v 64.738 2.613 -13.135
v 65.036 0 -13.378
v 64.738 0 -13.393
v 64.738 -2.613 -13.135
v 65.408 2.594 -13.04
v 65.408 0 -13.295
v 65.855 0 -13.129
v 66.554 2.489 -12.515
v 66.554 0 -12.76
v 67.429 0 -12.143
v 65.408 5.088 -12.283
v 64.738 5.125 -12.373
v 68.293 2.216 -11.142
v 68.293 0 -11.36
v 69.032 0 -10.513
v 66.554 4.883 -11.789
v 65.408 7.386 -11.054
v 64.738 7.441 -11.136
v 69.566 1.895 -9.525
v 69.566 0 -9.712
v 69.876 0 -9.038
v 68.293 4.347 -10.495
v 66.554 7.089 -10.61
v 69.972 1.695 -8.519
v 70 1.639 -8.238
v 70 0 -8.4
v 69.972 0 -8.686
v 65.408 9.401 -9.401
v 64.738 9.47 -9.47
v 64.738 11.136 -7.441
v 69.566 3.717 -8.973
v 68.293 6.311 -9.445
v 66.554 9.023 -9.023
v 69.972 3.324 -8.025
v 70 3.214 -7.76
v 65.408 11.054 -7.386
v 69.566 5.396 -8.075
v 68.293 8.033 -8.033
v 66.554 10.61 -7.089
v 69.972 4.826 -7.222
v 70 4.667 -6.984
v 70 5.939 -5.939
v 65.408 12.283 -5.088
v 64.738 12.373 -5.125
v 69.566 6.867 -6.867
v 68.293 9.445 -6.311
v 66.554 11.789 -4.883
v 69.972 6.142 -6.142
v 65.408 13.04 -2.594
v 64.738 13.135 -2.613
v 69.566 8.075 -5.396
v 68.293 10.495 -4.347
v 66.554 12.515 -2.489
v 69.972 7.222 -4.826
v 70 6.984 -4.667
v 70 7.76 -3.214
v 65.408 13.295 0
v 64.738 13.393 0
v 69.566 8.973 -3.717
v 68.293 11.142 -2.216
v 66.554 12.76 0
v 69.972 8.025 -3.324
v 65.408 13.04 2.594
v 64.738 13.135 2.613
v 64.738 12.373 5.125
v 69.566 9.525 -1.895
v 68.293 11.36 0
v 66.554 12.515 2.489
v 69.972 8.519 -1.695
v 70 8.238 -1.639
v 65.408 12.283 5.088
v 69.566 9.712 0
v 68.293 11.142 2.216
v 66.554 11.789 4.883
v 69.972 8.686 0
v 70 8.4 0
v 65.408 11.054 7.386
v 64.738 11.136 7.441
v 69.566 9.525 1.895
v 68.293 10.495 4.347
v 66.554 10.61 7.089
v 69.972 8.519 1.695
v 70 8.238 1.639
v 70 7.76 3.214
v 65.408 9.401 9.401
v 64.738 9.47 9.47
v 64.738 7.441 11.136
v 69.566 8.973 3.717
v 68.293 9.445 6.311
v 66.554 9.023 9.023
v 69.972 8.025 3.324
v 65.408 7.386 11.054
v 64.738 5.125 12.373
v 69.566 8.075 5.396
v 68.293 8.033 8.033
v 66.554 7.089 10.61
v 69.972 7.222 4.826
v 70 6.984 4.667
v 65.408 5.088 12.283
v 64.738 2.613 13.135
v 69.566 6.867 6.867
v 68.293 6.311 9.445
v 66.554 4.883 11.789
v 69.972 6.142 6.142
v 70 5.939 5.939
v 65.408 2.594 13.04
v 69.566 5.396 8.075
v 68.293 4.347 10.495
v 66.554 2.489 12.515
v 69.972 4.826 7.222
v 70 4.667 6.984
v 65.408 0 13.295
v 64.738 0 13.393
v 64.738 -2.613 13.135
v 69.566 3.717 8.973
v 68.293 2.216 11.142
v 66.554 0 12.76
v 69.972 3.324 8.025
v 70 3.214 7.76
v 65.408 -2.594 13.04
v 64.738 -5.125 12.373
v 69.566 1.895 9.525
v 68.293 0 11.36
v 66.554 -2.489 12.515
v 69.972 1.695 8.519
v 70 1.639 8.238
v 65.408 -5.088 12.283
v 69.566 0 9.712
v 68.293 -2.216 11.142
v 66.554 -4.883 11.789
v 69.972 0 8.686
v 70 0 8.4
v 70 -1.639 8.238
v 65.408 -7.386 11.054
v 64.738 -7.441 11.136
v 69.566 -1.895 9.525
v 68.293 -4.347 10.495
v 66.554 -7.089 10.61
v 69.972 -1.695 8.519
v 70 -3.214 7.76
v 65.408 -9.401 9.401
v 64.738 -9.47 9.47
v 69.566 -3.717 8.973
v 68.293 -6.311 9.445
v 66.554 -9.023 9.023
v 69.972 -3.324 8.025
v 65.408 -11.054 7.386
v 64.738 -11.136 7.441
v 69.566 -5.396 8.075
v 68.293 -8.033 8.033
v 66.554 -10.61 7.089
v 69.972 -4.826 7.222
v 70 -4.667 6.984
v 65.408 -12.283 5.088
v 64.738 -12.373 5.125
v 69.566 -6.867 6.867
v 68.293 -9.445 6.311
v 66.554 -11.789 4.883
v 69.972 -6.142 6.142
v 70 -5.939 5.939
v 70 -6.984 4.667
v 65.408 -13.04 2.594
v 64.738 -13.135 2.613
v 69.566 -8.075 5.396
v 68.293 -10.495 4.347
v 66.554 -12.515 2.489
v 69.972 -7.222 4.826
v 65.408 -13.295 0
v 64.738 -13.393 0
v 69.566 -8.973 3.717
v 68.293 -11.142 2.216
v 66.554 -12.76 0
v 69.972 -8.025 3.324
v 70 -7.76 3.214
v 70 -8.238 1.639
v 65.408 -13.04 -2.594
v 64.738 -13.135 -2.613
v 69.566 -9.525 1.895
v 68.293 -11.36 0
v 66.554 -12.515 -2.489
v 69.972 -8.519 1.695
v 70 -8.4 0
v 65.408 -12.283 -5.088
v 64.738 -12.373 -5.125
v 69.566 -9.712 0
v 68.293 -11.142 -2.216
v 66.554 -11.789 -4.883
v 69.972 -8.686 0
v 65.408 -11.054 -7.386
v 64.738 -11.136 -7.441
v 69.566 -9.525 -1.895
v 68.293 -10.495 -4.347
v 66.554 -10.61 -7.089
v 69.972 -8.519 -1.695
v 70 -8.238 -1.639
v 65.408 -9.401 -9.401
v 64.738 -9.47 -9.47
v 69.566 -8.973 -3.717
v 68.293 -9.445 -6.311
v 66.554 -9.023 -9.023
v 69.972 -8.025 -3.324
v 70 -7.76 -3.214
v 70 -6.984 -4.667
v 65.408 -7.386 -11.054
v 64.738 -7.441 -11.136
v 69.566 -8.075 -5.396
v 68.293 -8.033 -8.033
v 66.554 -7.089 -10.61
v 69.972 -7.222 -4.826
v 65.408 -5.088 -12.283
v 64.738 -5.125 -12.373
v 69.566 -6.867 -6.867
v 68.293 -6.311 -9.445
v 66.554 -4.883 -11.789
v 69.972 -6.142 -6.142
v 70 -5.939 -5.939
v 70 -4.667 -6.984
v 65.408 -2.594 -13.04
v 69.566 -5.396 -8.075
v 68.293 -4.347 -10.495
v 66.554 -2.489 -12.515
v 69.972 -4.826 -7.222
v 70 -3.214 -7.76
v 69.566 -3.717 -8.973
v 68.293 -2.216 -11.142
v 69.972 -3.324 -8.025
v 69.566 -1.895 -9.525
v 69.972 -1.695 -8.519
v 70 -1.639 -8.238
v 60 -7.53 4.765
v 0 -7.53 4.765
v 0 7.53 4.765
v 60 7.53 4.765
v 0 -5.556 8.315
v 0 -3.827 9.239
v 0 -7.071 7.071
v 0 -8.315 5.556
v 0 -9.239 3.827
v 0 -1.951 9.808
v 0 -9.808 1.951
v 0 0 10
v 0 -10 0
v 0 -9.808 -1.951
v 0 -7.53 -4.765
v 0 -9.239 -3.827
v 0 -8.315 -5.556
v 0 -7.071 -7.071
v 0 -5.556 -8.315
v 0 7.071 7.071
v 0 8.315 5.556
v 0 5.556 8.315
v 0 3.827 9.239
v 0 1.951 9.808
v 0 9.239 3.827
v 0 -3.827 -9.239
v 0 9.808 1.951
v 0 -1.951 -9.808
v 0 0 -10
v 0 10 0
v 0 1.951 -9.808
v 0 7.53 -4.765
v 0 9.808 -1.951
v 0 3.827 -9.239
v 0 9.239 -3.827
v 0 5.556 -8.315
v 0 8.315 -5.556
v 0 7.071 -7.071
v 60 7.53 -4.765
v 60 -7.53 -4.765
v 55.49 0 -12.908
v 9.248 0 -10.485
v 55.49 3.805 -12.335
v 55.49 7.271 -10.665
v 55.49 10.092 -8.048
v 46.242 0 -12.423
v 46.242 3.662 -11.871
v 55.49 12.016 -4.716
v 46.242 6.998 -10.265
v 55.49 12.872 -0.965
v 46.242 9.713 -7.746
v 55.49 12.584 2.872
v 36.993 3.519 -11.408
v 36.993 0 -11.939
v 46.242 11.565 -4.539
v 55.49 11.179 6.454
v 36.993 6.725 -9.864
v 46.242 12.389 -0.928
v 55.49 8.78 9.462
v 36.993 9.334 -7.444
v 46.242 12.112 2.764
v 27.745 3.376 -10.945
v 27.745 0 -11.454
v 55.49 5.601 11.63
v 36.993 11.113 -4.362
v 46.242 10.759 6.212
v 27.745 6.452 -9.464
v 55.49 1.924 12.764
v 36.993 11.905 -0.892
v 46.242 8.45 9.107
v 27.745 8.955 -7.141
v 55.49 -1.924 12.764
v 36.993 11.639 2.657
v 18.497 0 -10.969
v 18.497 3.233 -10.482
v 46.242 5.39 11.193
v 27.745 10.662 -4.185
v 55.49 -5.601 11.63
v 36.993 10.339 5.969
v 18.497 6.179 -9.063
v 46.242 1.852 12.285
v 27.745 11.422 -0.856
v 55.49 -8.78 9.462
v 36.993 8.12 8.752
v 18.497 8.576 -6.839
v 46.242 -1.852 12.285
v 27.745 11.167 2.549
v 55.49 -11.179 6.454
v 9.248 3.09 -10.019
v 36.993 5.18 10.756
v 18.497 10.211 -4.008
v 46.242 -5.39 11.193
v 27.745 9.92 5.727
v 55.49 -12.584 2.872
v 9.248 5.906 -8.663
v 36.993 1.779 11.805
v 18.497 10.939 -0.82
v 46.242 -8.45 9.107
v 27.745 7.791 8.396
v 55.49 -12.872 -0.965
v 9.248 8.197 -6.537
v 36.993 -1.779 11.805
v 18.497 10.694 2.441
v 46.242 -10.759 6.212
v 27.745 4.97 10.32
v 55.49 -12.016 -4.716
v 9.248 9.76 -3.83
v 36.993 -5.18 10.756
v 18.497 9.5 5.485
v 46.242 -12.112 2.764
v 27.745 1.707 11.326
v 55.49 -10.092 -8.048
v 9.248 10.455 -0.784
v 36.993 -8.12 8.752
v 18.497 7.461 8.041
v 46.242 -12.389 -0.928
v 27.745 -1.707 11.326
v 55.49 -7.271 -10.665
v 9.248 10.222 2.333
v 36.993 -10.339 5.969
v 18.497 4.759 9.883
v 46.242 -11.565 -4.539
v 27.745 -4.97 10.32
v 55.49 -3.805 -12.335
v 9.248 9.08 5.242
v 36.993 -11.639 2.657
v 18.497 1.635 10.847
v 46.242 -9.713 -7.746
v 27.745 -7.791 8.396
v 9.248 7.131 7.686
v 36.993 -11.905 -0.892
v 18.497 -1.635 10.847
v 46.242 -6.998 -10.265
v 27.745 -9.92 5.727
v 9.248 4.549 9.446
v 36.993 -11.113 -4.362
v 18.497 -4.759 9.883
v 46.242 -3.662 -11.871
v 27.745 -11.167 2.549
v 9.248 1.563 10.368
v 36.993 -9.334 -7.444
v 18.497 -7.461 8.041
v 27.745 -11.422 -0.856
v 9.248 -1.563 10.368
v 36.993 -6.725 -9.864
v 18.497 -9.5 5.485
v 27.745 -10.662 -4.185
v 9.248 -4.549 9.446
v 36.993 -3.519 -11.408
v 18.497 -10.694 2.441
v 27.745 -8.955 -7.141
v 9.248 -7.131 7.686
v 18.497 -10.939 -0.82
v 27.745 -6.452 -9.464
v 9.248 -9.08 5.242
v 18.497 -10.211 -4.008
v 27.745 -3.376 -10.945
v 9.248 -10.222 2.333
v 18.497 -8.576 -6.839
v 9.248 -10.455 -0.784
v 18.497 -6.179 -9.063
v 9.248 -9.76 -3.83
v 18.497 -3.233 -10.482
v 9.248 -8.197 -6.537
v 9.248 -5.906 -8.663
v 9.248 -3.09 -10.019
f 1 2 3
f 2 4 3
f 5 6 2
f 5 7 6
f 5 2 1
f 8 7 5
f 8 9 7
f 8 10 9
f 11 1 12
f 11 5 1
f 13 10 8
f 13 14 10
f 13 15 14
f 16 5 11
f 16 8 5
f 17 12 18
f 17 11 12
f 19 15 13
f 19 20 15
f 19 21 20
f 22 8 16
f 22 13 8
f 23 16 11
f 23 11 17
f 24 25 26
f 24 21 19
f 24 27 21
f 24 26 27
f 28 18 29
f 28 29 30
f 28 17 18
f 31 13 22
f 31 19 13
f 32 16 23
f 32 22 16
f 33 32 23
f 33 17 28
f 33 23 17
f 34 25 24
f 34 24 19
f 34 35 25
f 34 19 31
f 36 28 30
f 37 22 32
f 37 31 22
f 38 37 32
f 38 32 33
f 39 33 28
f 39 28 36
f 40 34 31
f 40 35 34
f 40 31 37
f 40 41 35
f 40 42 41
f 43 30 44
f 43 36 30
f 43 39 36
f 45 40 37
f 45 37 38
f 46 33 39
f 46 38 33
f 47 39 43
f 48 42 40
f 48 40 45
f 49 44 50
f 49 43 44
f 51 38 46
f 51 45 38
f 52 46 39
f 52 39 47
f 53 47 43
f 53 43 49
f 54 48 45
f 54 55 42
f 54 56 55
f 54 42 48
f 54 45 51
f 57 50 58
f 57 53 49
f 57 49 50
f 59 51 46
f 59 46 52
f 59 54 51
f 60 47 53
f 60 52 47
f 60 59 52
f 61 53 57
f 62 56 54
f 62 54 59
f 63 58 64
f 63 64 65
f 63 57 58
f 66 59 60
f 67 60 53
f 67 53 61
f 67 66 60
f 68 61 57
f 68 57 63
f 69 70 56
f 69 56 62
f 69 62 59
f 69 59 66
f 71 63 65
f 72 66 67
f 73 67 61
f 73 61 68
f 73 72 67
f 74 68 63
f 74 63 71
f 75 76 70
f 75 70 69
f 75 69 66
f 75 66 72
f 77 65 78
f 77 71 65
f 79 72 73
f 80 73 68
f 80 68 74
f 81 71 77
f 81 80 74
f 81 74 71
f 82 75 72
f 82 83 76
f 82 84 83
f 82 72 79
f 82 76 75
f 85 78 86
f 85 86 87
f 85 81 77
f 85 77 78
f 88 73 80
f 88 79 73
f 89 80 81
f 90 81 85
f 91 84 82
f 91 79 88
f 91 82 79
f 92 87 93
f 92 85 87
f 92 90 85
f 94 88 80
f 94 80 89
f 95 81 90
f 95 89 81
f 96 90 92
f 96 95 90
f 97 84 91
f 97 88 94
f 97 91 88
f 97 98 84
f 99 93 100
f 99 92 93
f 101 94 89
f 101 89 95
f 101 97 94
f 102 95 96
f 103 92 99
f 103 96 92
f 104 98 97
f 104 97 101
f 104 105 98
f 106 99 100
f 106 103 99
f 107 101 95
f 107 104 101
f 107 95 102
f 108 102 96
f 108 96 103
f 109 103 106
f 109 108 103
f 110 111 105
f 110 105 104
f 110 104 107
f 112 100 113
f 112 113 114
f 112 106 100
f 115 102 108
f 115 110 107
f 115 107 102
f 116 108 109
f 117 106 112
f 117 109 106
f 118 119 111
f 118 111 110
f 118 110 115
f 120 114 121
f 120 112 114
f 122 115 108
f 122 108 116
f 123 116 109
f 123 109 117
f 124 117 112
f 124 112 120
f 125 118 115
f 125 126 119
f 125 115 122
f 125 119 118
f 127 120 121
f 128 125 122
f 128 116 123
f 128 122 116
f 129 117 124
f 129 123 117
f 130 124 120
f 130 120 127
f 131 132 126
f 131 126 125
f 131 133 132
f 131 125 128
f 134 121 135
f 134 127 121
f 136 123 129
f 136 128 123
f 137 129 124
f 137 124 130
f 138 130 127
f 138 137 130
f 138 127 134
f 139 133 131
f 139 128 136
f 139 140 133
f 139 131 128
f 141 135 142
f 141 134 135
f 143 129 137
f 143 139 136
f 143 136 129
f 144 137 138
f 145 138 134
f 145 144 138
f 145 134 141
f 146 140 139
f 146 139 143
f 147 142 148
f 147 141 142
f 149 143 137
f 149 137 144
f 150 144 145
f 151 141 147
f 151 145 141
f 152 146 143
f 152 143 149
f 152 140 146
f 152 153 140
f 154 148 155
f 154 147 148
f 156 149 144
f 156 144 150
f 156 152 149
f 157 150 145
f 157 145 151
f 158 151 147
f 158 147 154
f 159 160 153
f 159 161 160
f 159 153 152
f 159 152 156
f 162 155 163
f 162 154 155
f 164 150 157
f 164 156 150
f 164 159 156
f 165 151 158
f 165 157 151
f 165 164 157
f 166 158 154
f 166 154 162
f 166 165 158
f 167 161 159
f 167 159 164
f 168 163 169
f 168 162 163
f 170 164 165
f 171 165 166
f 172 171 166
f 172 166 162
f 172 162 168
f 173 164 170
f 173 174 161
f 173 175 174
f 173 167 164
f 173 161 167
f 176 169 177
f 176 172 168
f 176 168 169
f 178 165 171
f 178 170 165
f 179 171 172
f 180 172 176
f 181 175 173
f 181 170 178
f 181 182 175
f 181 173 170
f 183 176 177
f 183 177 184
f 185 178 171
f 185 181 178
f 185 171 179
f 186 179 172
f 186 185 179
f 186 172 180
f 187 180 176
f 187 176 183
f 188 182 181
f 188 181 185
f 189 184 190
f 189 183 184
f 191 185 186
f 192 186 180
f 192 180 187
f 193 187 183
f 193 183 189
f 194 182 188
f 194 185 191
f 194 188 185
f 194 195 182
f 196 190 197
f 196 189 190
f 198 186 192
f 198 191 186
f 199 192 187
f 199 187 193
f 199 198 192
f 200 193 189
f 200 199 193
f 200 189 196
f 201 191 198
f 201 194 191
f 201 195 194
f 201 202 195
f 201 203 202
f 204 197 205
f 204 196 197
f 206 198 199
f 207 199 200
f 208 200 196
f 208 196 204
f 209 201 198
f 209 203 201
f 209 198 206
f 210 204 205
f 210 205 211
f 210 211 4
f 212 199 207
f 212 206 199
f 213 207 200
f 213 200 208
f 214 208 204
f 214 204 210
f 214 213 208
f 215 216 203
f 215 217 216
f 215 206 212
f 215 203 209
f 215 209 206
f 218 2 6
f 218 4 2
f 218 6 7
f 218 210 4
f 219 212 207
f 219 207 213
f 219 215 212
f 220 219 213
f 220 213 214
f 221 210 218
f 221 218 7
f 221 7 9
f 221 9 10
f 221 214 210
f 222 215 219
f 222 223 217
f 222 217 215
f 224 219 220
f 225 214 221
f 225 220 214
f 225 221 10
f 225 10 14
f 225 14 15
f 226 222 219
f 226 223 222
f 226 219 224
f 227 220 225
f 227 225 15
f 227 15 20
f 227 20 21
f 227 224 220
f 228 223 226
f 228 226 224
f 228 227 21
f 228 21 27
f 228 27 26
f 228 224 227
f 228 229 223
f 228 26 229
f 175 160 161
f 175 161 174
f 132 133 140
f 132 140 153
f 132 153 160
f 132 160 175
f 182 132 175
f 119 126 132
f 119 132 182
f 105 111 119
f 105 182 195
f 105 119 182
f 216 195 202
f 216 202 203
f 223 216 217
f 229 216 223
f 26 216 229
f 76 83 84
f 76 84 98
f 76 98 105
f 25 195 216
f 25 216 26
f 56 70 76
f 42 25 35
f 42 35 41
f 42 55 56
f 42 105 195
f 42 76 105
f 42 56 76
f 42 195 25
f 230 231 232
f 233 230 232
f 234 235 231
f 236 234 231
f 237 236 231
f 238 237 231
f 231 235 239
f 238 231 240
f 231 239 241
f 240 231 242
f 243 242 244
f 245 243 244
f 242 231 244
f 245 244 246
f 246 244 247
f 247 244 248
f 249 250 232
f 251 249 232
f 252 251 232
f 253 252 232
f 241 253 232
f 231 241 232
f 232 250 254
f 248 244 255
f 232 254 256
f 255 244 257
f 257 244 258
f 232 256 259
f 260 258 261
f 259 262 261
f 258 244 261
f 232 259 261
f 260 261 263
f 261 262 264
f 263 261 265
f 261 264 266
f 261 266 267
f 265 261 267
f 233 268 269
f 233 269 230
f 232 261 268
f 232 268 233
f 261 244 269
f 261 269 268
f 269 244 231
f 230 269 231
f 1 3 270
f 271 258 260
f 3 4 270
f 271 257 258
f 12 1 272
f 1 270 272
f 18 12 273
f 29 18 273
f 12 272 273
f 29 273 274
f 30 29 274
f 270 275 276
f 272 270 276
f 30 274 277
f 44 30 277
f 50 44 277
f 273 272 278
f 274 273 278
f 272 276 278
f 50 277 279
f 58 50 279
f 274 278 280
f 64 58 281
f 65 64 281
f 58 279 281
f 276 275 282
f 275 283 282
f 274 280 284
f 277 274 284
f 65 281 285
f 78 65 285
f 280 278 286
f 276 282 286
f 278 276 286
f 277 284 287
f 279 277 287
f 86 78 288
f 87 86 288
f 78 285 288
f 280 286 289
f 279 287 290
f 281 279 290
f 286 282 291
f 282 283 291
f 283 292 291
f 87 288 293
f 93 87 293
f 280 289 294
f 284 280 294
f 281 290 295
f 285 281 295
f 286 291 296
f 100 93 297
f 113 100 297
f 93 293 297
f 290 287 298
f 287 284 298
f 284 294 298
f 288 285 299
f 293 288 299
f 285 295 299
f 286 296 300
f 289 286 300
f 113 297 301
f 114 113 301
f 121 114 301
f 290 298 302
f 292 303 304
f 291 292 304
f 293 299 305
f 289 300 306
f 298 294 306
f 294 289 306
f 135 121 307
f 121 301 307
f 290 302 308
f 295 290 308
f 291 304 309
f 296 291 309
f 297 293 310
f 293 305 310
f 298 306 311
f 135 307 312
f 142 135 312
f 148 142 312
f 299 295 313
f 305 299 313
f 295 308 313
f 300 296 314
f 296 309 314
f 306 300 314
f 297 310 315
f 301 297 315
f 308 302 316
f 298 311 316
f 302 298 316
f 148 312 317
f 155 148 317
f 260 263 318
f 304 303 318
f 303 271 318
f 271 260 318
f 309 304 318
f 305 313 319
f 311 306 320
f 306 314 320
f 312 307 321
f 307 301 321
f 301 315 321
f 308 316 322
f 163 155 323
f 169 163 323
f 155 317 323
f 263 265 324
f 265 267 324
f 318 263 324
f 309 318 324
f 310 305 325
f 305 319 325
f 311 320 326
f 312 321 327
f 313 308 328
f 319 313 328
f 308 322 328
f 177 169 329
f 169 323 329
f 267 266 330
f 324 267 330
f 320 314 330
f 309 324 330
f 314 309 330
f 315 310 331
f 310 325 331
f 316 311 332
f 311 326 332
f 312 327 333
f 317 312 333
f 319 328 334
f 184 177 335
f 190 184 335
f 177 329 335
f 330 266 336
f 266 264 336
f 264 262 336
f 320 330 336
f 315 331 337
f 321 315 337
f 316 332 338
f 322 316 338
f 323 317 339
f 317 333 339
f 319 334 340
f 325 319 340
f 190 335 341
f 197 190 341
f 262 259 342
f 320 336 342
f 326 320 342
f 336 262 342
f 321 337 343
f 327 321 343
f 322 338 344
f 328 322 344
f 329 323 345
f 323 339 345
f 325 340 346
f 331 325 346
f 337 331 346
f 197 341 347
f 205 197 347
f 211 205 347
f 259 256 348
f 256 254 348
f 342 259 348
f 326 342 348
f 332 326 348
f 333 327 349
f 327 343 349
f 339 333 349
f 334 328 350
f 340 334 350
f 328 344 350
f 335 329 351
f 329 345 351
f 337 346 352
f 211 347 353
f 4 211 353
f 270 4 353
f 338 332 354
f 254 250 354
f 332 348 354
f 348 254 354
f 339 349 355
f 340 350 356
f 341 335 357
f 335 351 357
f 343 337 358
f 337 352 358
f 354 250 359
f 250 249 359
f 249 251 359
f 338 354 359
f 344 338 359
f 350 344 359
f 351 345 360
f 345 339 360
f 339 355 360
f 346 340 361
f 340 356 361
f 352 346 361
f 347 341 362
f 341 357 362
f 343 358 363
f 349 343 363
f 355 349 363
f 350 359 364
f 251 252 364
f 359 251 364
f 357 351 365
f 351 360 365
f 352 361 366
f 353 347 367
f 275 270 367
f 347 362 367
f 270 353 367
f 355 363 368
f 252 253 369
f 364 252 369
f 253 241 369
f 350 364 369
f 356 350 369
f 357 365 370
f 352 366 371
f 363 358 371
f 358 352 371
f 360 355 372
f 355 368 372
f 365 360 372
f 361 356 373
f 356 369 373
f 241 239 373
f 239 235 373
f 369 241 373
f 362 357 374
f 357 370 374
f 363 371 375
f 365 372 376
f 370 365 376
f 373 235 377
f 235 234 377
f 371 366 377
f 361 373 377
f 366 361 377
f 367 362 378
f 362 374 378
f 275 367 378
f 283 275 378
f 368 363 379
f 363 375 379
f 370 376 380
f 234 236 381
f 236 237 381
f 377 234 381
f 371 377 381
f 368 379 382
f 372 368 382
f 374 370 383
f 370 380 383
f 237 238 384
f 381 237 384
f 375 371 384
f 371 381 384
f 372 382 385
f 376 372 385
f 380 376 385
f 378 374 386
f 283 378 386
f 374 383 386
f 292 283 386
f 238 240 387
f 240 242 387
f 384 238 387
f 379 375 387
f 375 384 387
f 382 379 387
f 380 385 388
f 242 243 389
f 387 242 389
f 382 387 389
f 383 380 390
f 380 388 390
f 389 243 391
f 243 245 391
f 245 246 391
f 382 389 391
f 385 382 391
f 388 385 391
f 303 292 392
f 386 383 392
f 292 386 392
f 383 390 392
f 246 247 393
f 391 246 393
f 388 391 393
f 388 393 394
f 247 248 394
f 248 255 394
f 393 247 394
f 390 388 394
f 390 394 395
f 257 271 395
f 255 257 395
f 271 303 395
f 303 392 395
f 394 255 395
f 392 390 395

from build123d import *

# Parameters (mm, degrees)
SZKIC1_R                    = 10
DODANIE_WYCI_GNI_CIE1_DEPTH = 70
DODANIE_WYCI_GNI_CIE1_DRAFT = -3
SZKIC2_W                    = 9.53
SZKIC2_H                    = 15.06
WYTNIJ_WYCI_GNI_CIE1_DEPTH  = 60


with BuildPart() as part:
    # Szkic1 → Dodanie-wyciągnięcie1 (with draft: the straight prism first)
    with BuildSketch(Plane(origin=(0, 0, 0), x_dir=(0, 0, -1), z_dir=(1, 0, 0))):
        Circle(SZKIC1_R)
    extrude(amount=DODANIE_WYCI_GNI_CIE1_DEPTH)
    # Dodanie-wyciągnięcie1: the draft: its side faces are tilted about the plane it starts from
    dodanie_wyci_gni_cie1_sides = [part.faces().sort_by_distance(p)[0] for p in [
        (35, 0, 10),
    ]]
    draft(dodanie_wyci_gni_cie1_sides, Plane(origin=(0, 0, 0), x_dir=(0, 0, -1), z_dir=(1, 0, 0)), DODANIE_WYCI_GNI_CIE1_DRAFT)

    # Zaokrąglenie1
    # a fillet whose section is not a circle: 5 mm, written as the material it takes off along each edge
    with BuildSketch(Plane(origin=(70, 0, 0), x_dir=(0, 0, -1), z_dir=(0, -1, 0))) as zaokr_glenie1_piece_1:
        with BuildLine():
            Bezier((13.392791597, -5.261679781), (13.66854455, 0), (8.399643923, 0), weights=[1, 0.344177288, 1])
            Line((8.399643923, 0), (13.66854455, 0))
            Line((13.66854455, 0), (13.392791597, -5.261679781))
        make_face()
    revolve(axis=Axis((70, 0, 0), (1, 0, 0)), mode=Mode.SUBTRACT)

    # Szkic2 → Wytnij-wyciągnięcie1 (cut)
    with BuildSketch(Plane.ZY):
        Rectangle(SZKIC2_W, SZKIC2_H)
    extrude(amount=-WYTNIJ_WYCI_GNI_CIE1_DEPTH, mode=Mode.SUBTRACT)


solid = part.part
